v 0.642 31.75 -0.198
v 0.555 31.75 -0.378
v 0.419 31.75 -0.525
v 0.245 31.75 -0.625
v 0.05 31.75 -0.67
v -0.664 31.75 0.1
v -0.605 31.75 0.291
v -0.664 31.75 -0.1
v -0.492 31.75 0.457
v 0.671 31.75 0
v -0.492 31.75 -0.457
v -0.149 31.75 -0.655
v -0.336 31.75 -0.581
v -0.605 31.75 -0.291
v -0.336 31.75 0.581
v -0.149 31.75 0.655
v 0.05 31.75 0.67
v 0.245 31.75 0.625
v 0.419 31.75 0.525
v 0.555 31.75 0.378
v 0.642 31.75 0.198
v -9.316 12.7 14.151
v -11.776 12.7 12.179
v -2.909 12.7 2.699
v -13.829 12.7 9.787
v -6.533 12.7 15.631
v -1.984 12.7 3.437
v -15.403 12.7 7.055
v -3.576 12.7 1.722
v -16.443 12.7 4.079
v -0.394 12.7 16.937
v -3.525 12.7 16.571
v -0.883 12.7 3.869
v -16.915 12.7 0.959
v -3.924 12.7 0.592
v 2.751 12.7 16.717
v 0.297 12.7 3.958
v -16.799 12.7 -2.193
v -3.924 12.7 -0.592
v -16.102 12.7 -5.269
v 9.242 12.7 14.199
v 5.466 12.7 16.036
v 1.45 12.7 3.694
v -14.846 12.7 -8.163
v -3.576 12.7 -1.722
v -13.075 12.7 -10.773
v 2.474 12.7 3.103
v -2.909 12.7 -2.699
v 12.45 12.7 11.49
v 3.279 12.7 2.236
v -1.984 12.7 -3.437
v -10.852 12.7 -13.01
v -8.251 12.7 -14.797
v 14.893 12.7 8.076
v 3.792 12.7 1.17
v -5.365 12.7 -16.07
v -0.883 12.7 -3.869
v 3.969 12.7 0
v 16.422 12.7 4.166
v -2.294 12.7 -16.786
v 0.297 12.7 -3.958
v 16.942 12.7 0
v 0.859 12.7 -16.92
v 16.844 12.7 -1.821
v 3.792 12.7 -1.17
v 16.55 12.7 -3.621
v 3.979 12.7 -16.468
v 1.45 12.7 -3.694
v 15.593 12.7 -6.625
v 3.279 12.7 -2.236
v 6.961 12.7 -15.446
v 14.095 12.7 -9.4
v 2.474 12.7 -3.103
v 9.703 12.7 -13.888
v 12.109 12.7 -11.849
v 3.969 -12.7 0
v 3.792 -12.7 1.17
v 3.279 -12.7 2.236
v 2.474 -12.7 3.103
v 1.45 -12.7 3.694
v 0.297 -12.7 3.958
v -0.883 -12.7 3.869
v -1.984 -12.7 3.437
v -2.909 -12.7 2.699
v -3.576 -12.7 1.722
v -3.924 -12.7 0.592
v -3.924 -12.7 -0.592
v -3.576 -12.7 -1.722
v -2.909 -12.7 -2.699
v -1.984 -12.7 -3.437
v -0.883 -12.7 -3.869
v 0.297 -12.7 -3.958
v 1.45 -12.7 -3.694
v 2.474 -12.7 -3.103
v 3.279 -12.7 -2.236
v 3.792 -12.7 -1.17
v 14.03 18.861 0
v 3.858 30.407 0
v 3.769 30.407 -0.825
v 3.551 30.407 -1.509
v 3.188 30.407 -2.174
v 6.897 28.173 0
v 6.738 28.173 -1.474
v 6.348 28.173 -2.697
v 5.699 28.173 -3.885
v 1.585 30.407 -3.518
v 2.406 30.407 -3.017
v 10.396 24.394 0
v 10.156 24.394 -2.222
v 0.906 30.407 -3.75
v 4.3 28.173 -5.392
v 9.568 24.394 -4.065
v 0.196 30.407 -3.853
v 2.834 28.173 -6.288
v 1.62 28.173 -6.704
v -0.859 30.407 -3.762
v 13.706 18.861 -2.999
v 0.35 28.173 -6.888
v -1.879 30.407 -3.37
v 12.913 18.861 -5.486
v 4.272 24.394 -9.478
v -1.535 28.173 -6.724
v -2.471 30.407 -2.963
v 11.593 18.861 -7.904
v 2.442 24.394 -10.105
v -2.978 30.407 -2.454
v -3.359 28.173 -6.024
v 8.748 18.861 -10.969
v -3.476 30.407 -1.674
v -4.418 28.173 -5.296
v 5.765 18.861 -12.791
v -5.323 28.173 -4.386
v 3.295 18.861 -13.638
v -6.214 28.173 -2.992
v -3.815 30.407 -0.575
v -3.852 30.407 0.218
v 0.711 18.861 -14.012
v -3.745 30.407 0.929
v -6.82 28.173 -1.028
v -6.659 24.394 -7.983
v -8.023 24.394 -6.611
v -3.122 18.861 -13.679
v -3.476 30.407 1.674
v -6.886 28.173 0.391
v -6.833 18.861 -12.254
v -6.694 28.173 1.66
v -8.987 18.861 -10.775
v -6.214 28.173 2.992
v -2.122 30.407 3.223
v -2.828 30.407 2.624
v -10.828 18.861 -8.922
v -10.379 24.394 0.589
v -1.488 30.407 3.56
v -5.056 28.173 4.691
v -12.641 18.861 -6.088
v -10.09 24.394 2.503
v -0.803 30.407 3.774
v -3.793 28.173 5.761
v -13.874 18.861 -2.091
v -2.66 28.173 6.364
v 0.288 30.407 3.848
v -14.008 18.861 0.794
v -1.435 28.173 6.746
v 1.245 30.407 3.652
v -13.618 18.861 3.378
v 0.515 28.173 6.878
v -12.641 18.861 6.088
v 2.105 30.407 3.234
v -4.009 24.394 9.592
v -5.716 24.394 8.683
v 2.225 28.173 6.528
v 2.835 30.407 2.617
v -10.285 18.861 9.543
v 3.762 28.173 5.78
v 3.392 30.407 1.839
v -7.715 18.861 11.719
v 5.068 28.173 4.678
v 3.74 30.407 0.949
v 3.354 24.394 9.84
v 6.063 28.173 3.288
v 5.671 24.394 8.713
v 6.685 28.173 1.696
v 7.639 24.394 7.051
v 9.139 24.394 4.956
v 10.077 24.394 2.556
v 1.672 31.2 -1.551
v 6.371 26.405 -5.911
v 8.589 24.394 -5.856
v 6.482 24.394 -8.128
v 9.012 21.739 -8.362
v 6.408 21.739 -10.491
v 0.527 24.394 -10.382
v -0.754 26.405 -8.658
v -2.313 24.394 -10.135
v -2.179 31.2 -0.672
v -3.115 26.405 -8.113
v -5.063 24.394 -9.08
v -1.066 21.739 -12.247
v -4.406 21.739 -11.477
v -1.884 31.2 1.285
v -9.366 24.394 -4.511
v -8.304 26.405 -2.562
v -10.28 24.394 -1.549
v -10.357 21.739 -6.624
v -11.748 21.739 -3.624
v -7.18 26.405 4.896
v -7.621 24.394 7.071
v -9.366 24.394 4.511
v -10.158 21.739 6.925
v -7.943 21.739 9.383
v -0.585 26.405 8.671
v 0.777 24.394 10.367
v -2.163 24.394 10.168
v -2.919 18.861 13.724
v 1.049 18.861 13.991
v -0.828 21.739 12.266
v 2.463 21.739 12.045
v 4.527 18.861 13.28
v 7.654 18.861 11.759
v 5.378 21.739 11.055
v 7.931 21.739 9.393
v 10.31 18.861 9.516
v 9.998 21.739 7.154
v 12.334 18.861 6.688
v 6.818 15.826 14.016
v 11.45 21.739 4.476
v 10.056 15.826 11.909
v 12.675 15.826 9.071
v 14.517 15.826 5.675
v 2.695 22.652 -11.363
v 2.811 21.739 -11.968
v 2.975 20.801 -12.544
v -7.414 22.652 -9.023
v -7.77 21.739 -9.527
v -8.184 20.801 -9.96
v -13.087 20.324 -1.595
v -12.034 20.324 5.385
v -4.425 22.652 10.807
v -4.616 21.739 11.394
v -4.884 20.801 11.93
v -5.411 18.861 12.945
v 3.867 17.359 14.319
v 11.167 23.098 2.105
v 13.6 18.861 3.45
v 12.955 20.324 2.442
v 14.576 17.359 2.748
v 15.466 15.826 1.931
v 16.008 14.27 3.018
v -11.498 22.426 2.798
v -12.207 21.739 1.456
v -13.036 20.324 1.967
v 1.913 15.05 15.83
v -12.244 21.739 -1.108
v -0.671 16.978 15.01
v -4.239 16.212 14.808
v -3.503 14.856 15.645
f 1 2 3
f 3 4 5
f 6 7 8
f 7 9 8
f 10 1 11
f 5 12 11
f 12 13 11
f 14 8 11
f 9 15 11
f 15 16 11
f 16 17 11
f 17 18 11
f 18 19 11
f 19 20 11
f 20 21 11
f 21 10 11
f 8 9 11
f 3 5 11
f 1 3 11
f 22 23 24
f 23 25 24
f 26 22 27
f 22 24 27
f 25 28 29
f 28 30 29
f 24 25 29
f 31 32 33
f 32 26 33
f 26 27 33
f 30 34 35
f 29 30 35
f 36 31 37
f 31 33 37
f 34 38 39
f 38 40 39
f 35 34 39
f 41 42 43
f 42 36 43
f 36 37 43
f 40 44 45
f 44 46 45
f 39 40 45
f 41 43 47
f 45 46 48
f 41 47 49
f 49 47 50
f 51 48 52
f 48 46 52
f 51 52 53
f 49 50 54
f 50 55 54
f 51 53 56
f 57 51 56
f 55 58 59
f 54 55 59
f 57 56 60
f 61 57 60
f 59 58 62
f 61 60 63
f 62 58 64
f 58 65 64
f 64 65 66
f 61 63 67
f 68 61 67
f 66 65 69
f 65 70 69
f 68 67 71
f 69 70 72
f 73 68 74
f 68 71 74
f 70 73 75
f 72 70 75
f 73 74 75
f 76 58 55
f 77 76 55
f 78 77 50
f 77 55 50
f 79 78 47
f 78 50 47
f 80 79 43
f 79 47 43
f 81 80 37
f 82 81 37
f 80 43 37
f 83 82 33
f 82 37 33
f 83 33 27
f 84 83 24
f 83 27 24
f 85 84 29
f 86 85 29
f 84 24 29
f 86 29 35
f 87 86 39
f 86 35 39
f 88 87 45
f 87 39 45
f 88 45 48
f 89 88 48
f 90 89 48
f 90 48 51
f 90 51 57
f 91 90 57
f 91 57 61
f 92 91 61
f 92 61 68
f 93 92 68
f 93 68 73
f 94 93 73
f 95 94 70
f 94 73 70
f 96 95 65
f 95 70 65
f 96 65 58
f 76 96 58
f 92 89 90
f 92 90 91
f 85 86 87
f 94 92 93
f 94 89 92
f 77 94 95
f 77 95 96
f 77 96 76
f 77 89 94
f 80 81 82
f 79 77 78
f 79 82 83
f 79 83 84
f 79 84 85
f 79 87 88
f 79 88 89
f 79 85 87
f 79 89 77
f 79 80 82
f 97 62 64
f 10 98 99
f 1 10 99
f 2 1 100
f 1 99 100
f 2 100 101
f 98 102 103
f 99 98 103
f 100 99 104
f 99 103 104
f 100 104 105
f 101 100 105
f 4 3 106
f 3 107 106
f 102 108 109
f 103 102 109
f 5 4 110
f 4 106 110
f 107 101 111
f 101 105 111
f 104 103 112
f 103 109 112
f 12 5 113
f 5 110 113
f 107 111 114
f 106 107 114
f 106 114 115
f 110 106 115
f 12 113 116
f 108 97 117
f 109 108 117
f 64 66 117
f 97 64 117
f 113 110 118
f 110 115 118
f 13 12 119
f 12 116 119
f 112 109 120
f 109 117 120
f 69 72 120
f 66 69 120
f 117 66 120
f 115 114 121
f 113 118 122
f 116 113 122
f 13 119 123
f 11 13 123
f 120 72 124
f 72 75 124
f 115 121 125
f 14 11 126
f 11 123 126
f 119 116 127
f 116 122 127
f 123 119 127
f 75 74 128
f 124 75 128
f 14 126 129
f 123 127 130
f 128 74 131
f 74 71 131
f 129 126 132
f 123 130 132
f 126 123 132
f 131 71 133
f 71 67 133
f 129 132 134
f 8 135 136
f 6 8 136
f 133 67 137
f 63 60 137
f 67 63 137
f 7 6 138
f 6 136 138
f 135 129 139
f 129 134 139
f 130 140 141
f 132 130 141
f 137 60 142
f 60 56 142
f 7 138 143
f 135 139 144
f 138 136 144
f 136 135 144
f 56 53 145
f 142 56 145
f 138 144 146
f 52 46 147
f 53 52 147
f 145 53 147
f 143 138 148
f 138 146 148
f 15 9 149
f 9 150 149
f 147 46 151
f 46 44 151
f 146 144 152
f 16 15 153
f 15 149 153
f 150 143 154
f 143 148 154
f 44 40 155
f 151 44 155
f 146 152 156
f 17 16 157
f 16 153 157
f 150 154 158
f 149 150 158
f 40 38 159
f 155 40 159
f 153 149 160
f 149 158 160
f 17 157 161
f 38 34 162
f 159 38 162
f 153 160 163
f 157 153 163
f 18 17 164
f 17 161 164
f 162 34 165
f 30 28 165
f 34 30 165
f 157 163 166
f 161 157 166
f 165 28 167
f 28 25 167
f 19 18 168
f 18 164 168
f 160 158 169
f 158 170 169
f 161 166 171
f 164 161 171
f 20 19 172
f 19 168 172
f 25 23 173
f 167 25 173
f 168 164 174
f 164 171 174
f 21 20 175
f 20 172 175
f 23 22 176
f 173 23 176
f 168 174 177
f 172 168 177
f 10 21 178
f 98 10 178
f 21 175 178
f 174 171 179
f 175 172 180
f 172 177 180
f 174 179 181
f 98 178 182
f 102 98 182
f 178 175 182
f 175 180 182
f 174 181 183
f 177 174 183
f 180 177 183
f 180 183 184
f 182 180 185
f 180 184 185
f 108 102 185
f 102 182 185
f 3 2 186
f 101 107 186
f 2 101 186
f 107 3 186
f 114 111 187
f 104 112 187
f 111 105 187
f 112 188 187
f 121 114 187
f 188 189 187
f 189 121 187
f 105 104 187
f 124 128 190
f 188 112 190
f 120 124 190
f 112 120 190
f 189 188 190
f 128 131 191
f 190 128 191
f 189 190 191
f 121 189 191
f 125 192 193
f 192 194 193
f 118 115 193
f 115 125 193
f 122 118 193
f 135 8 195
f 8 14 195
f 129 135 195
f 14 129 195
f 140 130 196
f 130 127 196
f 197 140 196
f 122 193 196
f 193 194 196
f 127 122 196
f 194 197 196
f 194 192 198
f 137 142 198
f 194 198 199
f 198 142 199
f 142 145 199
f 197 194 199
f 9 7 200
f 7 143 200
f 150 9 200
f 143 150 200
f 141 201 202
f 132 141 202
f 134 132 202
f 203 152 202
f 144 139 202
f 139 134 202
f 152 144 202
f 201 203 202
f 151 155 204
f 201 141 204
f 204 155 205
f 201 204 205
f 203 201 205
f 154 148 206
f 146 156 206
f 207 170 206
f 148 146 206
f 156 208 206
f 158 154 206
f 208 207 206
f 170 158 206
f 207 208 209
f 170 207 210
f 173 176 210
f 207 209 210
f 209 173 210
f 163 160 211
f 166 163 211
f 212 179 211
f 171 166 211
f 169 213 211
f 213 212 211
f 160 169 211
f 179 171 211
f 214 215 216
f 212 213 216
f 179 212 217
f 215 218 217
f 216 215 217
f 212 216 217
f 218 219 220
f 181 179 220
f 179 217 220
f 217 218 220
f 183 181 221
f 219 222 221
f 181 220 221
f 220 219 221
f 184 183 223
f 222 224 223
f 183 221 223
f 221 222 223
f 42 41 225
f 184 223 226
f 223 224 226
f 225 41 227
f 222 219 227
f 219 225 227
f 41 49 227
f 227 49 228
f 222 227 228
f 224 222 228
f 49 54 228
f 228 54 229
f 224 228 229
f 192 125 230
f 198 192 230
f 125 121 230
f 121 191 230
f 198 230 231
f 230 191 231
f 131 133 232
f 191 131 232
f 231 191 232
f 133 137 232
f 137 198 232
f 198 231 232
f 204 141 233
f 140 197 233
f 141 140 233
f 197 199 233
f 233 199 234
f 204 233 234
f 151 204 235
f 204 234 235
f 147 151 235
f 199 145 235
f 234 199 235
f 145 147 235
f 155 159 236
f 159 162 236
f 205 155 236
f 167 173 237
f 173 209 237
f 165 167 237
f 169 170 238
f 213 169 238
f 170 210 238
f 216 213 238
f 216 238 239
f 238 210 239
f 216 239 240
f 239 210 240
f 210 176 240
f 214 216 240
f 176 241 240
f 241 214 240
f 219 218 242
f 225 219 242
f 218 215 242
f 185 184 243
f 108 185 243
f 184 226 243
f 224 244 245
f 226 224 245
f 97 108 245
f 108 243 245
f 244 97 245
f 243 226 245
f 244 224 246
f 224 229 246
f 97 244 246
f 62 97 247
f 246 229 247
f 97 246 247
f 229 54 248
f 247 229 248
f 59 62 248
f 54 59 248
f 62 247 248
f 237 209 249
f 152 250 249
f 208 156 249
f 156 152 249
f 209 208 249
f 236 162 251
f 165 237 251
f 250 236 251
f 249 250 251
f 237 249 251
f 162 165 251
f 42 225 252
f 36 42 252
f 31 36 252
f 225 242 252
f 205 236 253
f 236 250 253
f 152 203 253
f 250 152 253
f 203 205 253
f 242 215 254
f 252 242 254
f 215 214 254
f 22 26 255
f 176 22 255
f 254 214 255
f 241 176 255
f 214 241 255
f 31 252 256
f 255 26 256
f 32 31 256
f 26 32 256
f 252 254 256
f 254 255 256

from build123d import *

# Parameters (mm, degrees)
CUT_EXTRUDE1_DEPTH      = 43.521318352
CUT_EXTRUDE1_DEPTH_BACK = 43.521318352
SKETCH1_W               = 53.107977593
SKETCH1_H               = 23.637371429
SKETCH5_R               = 3.96875
BOSS_EXTRUDE1_DEPTH     = 25.4


with BuildPart() as part:
    # 草图1 → 旋转1 (revolve)
    with BuildSketch(Plane.XY):
        with BuildLine():
            Line((0, 0), (0, 31.75))
            Line((0, 31.75), (0.671450483, 31.75))
            add(Edge.make_bspline(
                [(0.671450483, 31.75), (10.760339504, 29.131046737), (19.406701728, 11.219456234), (20, 0)],
                knots=[0.132414506, 0.132414506, 0.132414506, 0.132414506, 1, 1, 1, 1], degree=3))
            Line((20, 0), (0, 0))
        make_face()
    revolve(axis=Axis((0, 0, 0), (0, 1, 0)))

    # Sketch1 → Cut-Extrude1 (cut, two sides: drawn at the far end of the back side and taken through both)
    with BuildSketch(Plane.XY.offset(-CUT_EXTRUDE1_DEPTH_BACK)):
        with Locations((1.111771429, 0.881314286)):
            Rectangle(SKETCH1_W, SKETCH1_H)
    extrude(amount=CUT_EXTRUDE1_DEPTH + CUT_EXTRUDE1_DEPTH_BACK, mode=Mode.SUBTRACT)

    # Sketch5 → Boss-Extrude1 (add)
    with BuildSketch(Plane.XZ.offset(-12.7)):
        Circle(SKETCH5_R)
    extrude(amount=BOSS_EXTRUDE1_DEPTH)


solid = part.part
